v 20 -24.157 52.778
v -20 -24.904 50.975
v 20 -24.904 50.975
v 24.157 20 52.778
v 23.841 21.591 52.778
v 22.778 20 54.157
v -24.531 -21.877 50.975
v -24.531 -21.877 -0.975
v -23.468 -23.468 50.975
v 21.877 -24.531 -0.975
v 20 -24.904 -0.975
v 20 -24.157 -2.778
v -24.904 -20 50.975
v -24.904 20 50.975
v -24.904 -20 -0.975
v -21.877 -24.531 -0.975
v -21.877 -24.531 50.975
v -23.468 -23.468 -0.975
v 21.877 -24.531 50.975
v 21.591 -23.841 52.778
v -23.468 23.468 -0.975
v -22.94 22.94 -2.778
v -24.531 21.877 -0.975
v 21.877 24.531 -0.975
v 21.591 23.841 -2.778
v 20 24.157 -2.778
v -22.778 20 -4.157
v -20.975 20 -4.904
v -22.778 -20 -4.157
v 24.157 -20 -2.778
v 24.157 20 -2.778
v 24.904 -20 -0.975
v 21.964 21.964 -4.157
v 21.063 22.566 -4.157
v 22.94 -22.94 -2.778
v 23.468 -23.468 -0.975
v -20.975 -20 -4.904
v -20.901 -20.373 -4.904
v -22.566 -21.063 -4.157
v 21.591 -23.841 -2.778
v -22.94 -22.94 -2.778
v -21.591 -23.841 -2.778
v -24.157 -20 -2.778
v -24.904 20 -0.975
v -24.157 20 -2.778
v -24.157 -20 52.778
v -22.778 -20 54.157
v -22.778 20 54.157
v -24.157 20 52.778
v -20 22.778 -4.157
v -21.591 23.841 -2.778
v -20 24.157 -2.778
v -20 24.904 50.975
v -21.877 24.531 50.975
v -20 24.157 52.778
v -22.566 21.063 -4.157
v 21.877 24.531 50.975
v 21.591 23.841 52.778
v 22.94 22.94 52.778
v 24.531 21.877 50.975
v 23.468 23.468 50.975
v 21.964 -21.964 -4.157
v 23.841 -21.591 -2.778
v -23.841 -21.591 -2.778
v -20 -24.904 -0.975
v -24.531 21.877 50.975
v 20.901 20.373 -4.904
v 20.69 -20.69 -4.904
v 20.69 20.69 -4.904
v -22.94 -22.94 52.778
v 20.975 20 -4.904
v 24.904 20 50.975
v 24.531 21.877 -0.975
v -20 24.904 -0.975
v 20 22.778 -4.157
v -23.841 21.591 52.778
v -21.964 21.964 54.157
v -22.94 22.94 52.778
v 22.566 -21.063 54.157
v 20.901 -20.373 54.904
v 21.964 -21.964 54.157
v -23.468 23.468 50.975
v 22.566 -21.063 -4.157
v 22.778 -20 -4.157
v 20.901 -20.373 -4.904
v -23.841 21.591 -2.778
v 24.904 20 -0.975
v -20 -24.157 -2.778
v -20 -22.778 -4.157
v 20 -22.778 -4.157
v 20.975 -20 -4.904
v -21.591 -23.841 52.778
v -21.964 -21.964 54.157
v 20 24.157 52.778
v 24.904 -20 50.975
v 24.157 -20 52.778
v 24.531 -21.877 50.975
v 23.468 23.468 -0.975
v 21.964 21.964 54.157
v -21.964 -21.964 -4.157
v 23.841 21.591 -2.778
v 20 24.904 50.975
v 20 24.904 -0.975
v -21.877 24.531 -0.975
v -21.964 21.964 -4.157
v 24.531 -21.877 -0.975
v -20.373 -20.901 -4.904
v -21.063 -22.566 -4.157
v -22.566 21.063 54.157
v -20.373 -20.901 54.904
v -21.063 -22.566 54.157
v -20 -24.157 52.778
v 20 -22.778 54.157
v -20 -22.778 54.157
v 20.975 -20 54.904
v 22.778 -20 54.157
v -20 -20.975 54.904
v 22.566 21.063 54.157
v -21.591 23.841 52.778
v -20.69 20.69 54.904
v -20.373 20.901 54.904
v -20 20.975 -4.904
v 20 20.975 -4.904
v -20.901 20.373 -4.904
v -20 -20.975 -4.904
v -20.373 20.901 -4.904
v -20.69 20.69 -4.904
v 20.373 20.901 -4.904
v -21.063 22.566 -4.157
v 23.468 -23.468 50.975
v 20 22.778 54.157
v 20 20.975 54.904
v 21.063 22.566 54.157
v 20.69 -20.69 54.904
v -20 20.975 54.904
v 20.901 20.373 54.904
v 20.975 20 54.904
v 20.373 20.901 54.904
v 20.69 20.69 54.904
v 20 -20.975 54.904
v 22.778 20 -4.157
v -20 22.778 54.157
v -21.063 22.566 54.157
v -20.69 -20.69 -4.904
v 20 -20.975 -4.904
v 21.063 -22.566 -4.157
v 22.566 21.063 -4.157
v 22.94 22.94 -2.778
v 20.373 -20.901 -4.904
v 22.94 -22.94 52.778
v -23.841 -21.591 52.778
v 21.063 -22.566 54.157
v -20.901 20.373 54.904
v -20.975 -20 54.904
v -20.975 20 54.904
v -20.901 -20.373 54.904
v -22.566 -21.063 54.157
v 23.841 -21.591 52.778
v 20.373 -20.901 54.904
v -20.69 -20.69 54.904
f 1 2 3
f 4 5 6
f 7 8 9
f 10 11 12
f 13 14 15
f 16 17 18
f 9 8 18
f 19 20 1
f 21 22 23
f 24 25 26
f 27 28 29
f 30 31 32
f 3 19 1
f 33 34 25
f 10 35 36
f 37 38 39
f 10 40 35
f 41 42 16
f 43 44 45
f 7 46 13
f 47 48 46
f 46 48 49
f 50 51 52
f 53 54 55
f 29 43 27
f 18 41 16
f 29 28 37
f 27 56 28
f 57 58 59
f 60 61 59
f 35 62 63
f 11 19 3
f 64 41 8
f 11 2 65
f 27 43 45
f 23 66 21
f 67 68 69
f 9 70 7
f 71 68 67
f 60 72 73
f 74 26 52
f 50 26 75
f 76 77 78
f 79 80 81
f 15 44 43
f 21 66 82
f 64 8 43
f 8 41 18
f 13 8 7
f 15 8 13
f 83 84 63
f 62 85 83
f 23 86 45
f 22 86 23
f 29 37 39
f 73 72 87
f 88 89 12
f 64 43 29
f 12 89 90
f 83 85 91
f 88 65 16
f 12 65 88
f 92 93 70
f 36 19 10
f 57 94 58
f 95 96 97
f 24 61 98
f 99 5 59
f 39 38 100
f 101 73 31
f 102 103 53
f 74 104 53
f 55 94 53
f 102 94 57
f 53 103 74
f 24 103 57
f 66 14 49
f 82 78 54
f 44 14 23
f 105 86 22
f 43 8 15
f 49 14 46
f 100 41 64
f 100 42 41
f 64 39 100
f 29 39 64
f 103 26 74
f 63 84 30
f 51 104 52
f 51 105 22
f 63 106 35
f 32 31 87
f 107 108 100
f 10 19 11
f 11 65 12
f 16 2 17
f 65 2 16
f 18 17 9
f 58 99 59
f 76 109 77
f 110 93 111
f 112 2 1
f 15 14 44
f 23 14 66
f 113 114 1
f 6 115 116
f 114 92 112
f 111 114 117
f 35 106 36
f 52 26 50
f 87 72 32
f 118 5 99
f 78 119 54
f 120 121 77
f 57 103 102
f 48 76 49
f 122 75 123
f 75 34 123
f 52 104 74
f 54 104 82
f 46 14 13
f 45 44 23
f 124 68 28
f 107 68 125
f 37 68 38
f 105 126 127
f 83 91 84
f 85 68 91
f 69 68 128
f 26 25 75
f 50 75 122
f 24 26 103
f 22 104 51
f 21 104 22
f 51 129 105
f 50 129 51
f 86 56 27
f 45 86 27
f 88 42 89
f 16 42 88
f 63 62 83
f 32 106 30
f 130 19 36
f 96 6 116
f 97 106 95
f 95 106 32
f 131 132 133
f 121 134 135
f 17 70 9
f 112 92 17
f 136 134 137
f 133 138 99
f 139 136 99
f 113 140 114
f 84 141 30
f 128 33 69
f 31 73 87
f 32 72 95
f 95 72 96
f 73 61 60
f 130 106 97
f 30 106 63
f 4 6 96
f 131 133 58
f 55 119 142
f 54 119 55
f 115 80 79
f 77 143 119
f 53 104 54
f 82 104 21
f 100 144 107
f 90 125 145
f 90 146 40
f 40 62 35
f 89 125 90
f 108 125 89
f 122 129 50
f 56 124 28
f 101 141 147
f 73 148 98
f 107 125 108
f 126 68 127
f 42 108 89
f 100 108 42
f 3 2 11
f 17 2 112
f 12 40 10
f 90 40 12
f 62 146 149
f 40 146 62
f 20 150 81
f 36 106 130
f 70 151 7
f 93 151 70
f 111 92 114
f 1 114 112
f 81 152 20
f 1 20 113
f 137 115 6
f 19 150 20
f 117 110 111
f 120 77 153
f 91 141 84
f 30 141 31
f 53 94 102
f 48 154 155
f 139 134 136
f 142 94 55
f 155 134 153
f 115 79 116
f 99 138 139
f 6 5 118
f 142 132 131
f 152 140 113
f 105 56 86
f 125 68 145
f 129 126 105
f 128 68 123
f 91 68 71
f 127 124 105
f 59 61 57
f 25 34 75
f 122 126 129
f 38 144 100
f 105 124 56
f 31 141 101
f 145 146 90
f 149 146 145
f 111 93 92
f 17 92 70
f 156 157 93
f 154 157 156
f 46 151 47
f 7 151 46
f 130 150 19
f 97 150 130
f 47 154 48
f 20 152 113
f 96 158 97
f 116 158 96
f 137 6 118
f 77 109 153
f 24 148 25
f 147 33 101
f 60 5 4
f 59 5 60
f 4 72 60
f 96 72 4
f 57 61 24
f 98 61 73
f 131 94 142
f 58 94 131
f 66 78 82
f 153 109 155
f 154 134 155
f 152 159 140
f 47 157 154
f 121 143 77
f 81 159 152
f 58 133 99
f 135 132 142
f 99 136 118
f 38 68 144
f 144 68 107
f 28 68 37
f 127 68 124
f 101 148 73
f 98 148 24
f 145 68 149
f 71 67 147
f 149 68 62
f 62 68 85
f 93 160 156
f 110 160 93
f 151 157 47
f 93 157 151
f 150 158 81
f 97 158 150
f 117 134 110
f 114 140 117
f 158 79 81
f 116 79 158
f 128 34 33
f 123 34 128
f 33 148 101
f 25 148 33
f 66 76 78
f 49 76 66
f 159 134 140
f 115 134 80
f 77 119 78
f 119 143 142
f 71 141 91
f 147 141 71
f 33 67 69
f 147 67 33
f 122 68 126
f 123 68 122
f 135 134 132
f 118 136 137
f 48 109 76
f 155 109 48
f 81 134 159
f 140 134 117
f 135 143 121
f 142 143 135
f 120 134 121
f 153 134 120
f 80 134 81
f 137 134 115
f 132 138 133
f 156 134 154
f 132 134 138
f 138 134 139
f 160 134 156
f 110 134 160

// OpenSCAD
//OpenSCAD script:

roundness = 5;
round_corners = true; // can be imported in FreeCAD when this is false, an error is thrown during import when true

module rect(width, height) {
translate([-width / 2, -height / 2])
cube([width, height, 1]);
}

module sphereRect(width, height) {
if(round_corners) {
translate([-width / 2 + roundness, -height / 2 + roundness])
sphere(roundness);
translate([width / 2 - roundness, -height / 2 + roundness])
sphere(roundness);
translate([width / 2 - roundness, height / 2 - roundness])
sphere(roundness);
translate([-width / 2 + roundness, height / 2 - roundness])
sphere(roundness); 
} else {
rect(width, height);
}
}

hull() {
sphereRect(50, 50);
translate([0, 0, 50])
sphereRect(50, 50);
}
